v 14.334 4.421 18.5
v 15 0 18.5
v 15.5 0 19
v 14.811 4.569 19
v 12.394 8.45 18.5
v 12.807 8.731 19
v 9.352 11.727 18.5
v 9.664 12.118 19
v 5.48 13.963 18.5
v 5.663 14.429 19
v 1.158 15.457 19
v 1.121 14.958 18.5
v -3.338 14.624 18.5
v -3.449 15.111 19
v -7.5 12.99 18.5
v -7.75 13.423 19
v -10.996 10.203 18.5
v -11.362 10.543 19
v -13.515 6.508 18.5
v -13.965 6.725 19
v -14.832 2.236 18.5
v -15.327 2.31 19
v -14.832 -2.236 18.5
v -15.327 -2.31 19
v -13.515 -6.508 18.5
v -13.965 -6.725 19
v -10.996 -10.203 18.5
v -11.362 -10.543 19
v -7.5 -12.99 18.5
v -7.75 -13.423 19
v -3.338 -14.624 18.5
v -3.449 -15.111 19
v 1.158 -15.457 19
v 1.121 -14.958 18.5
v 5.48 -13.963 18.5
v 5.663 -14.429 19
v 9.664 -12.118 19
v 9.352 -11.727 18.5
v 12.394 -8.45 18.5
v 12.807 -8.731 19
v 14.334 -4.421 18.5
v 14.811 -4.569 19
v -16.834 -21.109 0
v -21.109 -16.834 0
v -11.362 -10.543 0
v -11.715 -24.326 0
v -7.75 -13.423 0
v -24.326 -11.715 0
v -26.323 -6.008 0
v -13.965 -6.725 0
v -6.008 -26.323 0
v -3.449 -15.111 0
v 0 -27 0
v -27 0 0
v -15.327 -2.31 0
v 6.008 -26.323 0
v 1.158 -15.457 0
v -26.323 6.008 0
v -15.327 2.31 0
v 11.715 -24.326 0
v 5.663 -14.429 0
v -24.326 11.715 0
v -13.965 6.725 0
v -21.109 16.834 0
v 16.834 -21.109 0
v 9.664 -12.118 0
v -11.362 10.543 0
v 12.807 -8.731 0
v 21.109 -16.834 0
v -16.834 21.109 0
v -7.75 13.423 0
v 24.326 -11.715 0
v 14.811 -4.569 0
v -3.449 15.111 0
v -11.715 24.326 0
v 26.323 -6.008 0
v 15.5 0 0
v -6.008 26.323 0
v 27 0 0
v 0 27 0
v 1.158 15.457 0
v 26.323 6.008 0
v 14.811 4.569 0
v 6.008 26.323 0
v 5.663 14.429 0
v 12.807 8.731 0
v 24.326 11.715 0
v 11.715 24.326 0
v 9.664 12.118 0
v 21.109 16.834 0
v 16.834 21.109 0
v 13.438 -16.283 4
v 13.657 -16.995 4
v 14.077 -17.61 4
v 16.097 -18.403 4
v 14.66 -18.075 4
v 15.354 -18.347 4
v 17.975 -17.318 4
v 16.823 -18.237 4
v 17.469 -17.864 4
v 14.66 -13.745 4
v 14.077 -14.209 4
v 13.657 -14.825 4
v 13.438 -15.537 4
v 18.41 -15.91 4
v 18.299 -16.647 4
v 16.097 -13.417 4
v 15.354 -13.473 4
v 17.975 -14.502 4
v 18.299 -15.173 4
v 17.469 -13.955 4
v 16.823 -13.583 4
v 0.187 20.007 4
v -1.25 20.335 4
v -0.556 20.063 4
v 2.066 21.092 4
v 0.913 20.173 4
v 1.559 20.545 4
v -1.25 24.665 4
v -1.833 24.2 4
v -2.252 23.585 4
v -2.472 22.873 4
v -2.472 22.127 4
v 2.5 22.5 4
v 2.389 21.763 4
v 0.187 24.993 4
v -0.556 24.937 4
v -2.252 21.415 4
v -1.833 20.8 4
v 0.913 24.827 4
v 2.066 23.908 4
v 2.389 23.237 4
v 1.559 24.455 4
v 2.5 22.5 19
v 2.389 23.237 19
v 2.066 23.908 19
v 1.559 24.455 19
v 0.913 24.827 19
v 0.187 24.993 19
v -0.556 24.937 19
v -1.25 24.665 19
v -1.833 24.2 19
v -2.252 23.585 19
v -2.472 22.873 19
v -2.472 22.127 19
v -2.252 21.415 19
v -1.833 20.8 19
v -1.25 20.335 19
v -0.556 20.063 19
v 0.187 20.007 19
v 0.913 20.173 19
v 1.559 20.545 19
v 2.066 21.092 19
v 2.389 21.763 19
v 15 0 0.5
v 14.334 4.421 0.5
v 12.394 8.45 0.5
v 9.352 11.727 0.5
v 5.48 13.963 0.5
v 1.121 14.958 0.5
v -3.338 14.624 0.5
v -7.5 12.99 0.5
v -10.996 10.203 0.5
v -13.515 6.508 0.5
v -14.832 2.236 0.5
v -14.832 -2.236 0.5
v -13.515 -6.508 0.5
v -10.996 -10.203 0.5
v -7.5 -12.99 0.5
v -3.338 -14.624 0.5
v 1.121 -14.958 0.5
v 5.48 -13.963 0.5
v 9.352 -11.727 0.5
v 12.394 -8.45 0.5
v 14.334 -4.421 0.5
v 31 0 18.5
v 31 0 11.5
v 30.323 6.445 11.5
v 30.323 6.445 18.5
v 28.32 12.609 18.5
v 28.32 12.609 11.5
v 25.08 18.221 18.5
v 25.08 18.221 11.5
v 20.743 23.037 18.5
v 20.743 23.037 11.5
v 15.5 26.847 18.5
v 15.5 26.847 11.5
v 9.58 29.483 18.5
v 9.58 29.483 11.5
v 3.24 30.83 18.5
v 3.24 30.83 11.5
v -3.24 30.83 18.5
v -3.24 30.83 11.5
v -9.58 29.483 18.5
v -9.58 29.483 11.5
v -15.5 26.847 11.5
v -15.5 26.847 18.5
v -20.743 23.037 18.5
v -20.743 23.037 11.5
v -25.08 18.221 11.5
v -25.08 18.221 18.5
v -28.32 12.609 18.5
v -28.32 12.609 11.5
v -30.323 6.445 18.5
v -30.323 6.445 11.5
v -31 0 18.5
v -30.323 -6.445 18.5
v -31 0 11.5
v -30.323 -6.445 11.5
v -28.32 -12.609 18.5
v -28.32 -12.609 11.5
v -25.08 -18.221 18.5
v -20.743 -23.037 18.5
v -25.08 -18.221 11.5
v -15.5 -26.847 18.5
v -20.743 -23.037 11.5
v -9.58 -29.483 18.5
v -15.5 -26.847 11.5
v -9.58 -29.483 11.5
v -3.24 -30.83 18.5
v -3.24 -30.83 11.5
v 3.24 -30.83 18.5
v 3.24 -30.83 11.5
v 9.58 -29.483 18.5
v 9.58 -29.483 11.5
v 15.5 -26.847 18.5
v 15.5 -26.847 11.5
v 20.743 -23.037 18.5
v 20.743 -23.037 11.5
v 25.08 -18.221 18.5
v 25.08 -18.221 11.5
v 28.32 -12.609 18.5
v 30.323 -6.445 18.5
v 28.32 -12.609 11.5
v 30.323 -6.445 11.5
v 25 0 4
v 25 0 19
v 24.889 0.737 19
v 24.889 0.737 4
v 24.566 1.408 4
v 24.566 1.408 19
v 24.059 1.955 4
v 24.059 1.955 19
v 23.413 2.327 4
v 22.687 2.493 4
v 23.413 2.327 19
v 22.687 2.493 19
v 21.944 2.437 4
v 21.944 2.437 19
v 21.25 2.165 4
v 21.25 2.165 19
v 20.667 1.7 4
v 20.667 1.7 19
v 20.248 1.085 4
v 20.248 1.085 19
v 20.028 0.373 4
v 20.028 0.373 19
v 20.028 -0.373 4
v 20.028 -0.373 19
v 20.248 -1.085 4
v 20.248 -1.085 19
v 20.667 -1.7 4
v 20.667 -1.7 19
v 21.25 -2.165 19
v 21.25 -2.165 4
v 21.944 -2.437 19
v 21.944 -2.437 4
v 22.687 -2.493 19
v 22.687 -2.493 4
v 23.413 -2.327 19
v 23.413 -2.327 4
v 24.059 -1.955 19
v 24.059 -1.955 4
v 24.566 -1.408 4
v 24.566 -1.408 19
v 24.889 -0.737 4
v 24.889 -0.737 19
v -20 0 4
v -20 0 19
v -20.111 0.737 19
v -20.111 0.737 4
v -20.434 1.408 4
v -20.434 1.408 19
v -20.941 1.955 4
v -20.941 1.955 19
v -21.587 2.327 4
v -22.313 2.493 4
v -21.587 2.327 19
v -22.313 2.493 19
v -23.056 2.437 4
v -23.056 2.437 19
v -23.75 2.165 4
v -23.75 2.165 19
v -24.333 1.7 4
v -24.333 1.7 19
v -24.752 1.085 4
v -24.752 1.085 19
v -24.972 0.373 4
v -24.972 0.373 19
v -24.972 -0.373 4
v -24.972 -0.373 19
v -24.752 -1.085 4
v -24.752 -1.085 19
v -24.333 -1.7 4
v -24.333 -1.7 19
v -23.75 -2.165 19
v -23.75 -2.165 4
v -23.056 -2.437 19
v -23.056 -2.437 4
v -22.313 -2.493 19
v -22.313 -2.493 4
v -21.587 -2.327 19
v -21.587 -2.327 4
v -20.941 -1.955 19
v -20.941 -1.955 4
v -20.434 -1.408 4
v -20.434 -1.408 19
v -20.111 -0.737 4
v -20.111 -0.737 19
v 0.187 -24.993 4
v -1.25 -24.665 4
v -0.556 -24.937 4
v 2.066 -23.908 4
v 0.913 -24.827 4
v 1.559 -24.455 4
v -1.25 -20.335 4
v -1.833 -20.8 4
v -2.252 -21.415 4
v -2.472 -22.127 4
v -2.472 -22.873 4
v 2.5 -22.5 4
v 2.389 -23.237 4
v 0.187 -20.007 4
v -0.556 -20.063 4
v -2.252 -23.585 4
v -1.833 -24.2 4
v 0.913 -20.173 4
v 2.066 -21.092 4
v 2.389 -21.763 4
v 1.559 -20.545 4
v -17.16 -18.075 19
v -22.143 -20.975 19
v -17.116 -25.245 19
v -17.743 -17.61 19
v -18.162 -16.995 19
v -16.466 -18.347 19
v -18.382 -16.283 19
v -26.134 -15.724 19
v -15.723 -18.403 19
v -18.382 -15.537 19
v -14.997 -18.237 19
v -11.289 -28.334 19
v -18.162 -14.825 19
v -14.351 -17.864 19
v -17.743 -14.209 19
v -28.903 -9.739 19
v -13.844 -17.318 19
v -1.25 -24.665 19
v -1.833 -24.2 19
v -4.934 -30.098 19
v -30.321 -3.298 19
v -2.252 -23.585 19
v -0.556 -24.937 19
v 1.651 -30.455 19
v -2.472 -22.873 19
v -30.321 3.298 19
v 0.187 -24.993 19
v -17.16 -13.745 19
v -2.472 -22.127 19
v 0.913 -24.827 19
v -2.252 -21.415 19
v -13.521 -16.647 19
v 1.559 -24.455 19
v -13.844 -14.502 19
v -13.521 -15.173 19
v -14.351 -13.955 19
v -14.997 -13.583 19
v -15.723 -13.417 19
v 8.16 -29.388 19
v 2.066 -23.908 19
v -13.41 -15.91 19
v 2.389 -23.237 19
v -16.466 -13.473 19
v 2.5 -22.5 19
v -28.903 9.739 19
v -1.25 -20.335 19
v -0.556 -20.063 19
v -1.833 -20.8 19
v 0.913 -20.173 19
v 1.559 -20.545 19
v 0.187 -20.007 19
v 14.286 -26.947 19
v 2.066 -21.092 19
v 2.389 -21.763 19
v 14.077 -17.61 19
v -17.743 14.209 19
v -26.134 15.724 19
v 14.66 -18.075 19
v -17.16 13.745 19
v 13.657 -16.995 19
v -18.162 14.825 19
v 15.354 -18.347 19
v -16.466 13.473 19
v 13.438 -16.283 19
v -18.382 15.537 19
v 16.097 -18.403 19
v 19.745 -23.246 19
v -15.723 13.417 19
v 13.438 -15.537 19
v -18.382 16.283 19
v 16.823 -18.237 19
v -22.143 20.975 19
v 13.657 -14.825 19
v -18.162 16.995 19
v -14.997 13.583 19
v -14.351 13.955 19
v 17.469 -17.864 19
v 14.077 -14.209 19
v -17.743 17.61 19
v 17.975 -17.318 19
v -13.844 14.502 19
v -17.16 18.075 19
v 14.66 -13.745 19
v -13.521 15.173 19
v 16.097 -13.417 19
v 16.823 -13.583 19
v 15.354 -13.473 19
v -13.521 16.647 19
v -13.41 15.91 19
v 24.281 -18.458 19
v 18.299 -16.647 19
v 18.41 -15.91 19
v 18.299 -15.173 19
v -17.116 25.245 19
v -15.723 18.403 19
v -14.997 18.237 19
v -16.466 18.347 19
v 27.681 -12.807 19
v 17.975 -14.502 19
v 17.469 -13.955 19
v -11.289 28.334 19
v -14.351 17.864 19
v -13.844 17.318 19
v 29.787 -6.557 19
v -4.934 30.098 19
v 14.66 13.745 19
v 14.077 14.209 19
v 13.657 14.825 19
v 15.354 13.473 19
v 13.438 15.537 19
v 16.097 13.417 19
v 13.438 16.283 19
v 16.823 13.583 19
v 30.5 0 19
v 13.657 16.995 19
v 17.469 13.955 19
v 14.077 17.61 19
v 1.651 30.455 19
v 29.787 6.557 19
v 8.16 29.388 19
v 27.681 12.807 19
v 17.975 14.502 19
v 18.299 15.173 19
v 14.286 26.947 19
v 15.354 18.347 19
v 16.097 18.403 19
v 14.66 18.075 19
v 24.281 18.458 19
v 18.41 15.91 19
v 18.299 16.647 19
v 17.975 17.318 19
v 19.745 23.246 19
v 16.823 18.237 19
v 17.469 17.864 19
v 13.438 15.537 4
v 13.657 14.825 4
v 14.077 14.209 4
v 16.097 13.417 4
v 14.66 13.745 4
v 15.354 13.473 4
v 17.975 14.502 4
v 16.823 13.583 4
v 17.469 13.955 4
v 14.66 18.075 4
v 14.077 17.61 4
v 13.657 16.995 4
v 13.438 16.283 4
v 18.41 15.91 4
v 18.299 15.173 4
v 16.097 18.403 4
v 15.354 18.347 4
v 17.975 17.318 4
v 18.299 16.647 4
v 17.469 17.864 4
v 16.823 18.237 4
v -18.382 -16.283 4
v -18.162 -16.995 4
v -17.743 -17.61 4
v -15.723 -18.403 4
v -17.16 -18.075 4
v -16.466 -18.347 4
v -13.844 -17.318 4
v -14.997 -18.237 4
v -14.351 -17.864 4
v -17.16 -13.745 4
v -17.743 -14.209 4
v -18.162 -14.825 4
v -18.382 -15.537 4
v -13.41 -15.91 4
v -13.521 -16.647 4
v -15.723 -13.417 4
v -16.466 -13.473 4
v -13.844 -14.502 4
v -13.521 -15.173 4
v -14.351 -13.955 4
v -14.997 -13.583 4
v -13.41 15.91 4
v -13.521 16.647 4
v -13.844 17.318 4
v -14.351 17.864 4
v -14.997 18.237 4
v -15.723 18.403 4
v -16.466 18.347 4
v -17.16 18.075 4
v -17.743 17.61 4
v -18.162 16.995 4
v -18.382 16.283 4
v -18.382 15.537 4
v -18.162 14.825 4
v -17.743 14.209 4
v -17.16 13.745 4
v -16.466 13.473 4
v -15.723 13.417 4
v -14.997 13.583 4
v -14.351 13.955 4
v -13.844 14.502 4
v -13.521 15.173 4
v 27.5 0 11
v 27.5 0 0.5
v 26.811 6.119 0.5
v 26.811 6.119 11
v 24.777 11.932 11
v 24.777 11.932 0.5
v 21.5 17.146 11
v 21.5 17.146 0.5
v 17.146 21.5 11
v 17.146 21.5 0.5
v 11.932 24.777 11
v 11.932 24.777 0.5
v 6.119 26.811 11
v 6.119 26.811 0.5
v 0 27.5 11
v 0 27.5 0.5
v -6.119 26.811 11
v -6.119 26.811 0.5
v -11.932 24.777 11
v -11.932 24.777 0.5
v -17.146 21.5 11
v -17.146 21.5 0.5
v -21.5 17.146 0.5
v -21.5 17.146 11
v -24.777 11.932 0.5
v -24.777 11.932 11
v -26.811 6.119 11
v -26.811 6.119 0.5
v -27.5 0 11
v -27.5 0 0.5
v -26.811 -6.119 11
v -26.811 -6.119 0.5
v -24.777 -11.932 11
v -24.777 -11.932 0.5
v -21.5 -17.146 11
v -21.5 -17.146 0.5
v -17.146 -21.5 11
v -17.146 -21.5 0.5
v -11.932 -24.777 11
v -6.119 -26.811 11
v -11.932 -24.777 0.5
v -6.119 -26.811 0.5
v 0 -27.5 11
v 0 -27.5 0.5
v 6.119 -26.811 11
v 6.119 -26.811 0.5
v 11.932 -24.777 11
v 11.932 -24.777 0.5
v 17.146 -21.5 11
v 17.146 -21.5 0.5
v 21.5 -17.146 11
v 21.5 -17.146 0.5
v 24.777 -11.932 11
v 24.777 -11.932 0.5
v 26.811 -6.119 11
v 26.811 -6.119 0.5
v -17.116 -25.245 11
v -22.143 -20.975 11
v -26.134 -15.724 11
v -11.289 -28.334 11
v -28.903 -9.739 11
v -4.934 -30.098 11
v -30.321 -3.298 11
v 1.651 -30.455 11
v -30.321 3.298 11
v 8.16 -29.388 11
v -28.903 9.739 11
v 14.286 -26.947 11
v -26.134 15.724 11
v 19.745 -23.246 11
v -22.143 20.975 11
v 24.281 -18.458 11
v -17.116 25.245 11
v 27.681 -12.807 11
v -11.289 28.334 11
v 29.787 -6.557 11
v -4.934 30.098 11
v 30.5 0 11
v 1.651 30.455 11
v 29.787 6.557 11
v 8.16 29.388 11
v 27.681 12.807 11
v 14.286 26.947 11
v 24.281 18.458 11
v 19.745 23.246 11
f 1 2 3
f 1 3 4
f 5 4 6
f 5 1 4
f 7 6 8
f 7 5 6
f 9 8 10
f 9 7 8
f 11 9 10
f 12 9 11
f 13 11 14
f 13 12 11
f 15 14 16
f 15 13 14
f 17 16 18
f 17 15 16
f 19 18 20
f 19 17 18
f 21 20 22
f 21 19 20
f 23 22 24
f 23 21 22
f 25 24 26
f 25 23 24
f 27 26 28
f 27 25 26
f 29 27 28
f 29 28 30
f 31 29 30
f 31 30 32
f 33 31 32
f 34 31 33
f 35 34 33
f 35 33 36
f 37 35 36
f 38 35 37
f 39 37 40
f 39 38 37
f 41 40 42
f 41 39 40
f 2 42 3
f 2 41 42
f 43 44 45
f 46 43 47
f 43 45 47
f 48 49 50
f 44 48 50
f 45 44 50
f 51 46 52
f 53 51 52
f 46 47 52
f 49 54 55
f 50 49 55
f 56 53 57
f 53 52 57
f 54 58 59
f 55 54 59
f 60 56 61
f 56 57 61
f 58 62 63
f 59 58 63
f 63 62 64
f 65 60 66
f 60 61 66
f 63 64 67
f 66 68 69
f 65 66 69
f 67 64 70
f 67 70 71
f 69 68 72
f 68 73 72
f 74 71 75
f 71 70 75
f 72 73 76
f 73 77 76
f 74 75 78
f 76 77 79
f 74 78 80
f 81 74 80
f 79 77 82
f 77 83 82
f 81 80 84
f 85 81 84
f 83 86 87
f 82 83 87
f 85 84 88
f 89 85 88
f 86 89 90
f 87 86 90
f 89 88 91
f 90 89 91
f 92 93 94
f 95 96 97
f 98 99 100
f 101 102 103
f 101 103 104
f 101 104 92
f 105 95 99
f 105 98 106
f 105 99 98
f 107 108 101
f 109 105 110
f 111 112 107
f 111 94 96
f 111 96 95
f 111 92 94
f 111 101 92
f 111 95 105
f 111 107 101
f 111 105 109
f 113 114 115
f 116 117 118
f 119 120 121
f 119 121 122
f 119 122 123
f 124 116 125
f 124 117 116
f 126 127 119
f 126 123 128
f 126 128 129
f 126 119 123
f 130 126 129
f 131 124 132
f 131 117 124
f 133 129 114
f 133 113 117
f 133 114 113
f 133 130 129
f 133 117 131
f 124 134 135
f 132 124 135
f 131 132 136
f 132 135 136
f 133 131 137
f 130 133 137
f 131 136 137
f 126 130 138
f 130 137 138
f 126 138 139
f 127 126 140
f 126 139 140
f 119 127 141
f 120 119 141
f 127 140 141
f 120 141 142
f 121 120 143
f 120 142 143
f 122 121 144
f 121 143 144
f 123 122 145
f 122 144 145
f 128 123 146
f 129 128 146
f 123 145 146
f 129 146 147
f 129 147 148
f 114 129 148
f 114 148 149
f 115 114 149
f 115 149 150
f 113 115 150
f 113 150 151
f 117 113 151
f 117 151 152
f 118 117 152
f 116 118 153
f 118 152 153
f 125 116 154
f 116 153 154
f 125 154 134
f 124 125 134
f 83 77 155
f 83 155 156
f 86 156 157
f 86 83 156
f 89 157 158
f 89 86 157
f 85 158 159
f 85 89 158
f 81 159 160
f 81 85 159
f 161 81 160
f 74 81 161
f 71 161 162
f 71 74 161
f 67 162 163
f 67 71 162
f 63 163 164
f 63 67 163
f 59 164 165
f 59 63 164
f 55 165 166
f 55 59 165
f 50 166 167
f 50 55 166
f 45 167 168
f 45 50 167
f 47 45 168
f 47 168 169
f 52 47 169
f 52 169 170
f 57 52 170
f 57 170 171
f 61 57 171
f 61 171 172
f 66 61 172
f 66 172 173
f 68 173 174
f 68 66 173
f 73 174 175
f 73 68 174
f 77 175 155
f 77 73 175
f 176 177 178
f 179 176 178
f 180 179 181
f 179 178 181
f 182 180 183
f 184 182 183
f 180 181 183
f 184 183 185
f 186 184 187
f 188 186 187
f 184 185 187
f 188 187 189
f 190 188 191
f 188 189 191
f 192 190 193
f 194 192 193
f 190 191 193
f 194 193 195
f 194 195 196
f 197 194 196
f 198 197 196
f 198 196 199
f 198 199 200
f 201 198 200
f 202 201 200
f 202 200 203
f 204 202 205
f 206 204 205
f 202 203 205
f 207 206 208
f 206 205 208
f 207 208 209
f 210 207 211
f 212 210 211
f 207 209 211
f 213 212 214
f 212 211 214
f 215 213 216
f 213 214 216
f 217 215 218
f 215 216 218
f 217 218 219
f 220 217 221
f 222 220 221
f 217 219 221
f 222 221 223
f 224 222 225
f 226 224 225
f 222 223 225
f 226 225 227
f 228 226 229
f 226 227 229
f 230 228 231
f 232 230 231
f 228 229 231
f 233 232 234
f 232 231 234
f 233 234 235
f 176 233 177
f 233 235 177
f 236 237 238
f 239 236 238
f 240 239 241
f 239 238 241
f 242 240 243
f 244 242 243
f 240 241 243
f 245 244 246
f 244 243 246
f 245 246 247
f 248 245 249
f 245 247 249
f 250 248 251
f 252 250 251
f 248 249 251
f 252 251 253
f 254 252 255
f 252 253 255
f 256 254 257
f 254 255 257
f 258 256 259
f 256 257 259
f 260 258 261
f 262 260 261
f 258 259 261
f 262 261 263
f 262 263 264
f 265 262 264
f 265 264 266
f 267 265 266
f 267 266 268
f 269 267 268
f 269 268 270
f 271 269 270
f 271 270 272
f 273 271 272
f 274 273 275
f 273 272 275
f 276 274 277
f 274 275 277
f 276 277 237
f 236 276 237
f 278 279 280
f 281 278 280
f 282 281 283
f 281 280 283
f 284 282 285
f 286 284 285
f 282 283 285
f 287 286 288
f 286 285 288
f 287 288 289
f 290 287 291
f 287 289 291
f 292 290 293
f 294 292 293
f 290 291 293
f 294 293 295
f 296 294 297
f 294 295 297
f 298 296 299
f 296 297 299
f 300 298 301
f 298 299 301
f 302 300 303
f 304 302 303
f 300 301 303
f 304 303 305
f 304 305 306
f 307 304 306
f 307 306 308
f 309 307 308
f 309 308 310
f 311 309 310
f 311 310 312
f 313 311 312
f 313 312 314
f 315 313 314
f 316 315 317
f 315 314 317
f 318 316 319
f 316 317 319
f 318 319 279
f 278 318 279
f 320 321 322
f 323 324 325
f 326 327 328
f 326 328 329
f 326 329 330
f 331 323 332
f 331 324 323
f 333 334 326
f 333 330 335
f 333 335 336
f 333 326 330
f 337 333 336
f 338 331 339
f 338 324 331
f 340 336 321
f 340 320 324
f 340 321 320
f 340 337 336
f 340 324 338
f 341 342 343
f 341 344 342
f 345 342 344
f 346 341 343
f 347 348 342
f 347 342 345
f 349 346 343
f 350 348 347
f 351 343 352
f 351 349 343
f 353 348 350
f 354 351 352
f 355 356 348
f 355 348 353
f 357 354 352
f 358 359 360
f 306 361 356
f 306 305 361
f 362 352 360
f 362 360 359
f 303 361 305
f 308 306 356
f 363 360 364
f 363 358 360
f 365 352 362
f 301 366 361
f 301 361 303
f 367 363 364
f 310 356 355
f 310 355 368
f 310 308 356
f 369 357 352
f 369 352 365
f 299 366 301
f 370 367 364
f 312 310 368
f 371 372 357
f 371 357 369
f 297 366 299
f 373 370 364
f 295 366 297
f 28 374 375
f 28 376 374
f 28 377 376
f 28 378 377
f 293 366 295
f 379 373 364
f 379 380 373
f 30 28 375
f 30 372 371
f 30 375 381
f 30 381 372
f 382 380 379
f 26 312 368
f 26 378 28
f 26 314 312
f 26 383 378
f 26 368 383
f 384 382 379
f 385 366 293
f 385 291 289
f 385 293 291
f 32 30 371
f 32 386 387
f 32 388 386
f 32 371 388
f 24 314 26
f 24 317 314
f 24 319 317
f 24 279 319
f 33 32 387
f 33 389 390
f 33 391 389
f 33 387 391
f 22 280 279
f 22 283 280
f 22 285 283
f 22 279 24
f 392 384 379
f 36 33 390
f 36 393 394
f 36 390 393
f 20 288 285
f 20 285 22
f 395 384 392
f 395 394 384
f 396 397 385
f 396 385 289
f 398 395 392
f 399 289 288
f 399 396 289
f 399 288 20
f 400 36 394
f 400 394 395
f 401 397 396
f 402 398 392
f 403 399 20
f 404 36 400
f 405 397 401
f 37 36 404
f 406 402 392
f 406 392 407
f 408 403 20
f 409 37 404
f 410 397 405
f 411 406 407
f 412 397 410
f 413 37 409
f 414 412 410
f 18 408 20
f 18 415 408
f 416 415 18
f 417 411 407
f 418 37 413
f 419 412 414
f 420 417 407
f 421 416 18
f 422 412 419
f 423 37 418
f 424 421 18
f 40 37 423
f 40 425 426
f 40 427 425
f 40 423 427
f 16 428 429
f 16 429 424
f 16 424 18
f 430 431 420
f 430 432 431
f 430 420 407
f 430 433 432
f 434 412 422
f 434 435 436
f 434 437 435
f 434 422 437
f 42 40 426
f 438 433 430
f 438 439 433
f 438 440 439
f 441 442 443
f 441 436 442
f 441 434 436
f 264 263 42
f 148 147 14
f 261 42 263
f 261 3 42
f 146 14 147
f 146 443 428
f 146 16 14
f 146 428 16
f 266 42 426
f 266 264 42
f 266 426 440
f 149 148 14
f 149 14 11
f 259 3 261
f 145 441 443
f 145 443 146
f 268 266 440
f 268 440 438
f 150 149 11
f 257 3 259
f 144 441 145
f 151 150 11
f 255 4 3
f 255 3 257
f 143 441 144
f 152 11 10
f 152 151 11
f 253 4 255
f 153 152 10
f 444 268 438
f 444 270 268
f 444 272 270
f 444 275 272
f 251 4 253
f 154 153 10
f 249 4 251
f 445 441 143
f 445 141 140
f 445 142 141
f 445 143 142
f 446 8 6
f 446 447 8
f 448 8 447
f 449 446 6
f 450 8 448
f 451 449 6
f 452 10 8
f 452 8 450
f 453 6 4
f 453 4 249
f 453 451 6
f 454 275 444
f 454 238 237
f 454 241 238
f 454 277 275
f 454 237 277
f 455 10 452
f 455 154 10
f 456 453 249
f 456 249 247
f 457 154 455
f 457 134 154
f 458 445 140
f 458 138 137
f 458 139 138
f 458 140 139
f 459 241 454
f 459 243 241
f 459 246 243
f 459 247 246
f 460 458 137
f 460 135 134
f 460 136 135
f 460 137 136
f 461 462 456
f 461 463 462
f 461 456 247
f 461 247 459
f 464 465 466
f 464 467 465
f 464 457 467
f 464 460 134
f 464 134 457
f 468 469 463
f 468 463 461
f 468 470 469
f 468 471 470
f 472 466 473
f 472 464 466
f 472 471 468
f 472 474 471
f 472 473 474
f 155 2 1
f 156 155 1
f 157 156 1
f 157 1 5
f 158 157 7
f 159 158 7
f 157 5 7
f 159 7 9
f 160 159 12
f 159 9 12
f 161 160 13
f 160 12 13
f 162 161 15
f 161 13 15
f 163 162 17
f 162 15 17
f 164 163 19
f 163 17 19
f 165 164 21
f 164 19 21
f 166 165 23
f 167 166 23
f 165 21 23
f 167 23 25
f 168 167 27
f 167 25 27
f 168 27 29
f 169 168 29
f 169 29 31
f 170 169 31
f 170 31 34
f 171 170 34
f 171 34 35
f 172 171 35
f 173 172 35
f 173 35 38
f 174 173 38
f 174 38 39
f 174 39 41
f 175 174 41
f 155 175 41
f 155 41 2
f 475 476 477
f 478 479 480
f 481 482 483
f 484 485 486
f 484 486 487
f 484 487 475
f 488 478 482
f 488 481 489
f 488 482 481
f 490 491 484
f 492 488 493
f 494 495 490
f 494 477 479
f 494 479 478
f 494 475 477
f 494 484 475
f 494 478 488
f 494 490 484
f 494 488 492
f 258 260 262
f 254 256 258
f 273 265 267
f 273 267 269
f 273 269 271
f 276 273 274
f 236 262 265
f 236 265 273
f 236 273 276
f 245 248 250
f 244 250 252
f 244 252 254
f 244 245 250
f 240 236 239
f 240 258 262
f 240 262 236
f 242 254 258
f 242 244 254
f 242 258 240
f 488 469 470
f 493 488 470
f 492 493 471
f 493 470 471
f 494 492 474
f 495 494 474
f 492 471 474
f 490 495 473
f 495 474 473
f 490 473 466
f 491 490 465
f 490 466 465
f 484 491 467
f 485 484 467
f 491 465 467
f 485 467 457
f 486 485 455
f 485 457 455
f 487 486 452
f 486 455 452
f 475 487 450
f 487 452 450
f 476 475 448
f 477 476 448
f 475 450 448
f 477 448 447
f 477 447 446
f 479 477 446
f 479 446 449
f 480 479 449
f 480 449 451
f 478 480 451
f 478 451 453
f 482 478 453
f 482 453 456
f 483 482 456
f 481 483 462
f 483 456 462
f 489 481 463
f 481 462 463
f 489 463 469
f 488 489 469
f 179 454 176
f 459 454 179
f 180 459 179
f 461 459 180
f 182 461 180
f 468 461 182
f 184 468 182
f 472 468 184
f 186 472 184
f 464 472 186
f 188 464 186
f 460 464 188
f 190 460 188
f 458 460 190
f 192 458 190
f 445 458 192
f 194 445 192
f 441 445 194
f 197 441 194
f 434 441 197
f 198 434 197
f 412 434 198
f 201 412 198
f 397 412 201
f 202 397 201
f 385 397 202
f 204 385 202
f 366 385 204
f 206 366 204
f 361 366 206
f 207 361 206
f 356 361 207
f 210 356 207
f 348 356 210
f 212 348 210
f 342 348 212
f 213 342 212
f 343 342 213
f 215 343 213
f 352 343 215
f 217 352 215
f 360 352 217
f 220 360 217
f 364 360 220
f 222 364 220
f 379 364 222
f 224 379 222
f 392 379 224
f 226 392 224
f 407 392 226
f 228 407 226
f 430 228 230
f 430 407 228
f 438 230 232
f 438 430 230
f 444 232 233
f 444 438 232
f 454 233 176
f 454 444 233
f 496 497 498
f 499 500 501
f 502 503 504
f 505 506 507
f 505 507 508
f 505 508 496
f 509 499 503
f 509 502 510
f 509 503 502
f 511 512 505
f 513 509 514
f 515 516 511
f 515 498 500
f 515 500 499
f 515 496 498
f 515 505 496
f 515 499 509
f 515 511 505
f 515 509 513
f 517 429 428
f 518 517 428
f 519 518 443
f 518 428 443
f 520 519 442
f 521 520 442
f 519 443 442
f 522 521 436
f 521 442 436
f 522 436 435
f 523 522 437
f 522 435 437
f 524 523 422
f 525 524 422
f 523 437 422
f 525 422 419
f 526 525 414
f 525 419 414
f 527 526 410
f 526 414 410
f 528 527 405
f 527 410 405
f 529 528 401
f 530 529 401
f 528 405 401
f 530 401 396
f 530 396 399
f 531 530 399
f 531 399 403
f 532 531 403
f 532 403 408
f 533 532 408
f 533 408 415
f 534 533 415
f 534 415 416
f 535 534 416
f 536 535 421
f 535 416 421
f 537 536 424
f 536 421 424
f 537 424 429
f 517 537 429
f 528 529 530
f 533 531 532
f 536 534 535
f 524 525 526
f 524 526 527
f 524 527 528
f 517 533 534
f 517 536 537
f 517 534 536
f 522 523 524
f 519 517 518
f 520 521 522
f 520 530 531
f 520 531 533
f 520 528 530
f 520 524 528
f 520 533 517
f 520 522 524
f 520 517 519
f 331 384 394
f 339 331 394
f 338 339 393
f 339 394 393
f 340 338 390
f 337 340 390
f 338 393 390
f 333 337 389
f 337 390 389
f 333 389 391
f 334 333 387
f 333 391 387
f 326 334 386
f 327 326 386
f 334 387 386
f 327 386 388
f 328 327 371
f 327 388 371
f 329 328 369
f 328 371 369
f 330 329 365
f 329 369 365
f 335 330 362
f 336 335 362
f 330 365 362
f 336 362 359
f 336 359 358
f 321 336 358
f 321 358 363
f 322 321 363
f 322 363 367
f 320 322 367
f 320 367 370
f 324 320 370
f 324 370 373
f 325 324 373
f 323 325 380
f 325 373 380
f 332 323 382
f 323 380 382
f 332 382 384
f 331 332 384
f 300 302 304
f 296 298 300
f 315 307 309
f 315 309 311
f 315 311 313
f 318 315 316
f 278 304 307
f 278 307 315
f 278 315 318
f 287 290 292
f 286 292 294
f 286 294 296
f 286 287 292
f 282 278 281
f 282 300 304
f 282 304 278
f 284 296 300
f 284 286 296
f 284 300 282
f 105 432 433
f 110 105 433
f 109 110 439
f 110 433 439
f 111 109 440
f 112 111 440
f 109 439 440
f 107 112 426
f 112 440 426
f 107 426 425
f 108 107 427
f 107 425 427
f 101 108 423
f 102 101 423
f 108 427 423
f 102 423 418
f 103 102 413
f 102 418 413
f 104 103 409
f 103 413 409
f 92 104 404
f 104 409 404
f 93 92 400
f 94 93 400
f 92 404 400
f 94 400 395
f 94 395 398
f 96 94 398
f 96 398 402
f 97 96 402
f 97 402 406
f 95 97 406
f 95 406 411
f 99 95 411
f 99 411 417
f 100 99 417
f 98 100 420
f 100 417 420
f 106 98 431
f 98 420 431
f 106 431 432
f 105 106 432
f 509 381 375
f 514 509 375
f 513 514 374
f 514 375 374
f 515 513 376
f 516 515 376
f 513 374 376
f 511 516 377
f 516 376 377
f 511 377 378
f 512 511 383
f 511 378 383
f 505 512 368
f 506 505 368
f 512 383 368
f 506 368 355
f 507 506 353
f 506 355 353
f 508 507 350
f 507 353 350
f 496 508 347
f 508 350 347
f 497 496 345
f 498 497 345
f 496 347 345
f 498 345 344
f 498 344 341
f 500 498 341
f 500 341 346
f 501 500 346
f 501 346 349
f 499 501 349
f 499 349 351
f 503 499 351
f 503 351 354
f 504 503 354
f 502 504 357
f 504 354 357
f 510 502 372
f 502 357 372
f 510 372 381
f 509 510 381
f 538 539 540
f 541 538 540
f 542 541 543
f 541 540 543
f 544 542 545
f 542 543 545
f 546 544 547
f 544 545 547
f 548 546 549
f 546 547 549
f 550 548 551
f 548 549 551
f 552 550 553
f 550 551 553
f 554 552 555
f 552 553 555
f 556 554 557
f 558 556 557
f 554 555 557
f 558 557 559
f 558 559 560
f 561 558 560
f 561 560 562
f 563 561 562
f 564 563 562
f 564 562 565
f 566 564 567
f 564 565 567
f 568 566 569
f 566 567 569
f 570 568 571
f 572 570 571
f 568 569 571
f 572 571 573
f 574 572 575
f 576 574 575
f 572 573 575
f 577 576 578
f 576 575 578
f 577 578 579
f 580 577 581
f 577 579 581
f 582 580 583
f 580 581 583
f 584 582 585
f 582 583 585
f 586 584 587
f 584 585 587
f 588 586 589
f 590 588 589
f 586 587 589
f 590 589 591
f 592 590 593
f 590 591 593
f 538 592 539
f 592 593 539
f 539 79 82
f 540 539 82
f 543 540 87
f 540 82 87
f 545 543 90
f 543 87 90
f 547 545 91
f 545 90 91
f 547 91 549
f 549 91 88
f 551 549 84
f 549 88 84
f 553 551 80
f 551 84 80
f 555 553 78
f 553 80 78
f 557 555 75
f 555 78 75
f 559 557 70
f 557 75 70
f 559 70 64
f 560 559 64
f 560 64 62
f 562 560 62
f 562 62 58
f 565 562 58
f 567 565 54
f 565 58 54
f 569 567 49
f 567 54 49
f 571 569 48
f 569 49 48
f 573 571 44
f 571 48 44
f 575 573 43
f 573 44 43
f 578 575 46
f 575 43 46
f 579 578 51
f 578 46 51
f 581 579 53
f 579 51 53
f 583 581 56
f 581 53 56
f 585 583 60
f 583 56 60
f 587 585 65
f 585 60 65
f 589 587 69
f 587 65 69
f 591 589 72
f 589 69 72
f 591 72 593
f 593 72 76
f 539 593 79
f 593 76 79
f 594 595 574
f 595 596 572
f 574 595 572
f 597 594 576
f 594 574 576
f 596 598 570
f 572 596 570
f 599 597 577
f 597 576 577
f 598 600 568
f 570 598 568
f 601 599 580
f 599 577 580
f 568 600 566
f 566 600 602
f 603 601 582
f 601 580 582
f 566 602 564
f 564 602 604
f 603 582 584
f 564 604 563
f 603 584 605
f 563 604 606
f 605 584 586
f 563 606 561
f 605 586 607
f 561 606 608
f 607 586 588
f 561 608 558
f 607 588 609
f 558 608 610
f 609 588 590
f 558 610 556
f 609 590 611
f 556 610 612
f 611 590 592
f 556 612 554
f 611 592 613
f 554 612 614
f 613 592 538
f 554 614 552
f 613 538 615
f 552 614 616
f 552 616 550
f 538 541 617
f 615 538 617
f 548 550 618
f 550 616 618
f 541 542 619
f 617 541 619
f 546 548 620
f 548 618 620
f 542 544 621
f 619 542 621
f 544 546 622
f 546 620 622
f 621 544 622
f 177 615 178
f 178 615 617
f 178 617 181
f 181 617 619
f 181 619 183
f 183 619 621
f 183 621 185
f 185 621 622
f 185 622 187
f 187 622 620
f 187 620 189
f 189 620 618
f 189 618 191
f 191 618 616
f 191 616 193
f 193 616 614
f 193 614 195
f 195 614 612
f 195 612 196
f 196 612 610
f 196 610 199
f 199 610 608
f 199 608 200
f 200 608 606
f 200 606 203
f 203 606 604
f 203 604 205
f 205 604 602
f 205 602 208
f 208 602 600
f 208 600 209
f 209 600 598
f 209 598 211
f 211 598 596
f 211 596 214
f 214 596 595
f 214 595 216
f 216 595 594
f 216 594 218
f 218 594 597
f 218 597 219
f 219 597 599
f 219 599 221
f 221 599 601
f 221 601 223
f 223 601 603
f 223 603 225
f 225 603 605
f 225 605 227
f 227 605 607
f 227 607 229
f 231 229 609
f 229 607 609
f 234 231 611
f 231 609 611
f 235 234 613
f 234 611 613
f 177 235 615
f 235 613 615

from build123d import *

# Parameters (mm, degrees)
SKETCH_1_R          = 27.5
EXTRUDE_1_DEPTH     = 11
SKETCH_2_R          = 31
EXTRUDE_2_DEPTH     = 8
SKETCH_3_R          = 2.5
CUT_EXTRUDE_1_DEPTH = 15
SKETCH_4_R          = 15
CUT_EXTRUDE_2_DEPTH = 48.780749262
CHAMFER_1_SIZE      = 0.5
CHAMFER_2_SIZE      = 0.5


with BuildPart() as part:
    # 草图1 → 拉伸1 (new body)
    with BuildSketch(Plane.XY):
        Circle(SKETCH_1_R)
    extrude(amount=EXTRUDE_1_DEPTH)

    # 草图2 → 拉伸2 (add)
    with BuildSketch(Plane.XY.offset(11)):
        Circle(SKETCH_2_R)
    extrude(amount=EXTRUDE_2_DEPTH)

    # 草图3 → 切除-拉伸1 (cut)
    with BuildSketch(Plane.XY.offset(19)):
        with Locations((0, 22.5)):
            Circle(SKETCH_3_R)
        with Locations((15.909902577, 15.909902577)):
            Circle(SKETCH_3_R)
        with Locations((22.5, 0)):
            Circle(SKETCH_3_R)
        with Locations((15.909902577, -15.909902577)):
            Circle(SKETCH_3_R)
        with Locations((0, -22.5)):
            Circle(SKETCH_3_R)
        with Locations((-15.909902577, -15.909902577)):
            Circle(SKETCH_3_R)
        with Locations((-22.5, 0)):
            Circle(SKETCH_3_R)
        with Locations((-15.909902577, 15.909902577)):
            Circle(SKETCH_3_R)
    extrude(amount=-CUT_EXTRUDE_1_DEPTH, mode=Mode.SUBTRACT)

    # 草图4 → 切除-拉伸2 (cut, through all)
    with BuildSketch(Plane.XY.offset(19)):
        Circle(SKETCH_4_R)
    extrude(amount=-CUT_EXTRUDE_2_DEPTH, mode=Mode.SUBTRACT)

    # 倒角1
    chamfer_1_edges = [part.edges().sort_by_distance(p)[0] for p in [
        (-27.5, 0, 0),
        (-15, 0, 0),
        (-31, 0, 11),
        (-31, 0, 19),
    ]]
    chamfer(chamfer_1_edges, length=CHAMFER_1_SIZE)

    # 倒角2
    chamfer_2_edges = [part.edges().sort_by_distance(p)[0] for p in [
        (-15, 0, 19),
    ]]
    chamfer(chamfer_2_edges, length=CHAMFER_2_SIZE)


solid = part.part
